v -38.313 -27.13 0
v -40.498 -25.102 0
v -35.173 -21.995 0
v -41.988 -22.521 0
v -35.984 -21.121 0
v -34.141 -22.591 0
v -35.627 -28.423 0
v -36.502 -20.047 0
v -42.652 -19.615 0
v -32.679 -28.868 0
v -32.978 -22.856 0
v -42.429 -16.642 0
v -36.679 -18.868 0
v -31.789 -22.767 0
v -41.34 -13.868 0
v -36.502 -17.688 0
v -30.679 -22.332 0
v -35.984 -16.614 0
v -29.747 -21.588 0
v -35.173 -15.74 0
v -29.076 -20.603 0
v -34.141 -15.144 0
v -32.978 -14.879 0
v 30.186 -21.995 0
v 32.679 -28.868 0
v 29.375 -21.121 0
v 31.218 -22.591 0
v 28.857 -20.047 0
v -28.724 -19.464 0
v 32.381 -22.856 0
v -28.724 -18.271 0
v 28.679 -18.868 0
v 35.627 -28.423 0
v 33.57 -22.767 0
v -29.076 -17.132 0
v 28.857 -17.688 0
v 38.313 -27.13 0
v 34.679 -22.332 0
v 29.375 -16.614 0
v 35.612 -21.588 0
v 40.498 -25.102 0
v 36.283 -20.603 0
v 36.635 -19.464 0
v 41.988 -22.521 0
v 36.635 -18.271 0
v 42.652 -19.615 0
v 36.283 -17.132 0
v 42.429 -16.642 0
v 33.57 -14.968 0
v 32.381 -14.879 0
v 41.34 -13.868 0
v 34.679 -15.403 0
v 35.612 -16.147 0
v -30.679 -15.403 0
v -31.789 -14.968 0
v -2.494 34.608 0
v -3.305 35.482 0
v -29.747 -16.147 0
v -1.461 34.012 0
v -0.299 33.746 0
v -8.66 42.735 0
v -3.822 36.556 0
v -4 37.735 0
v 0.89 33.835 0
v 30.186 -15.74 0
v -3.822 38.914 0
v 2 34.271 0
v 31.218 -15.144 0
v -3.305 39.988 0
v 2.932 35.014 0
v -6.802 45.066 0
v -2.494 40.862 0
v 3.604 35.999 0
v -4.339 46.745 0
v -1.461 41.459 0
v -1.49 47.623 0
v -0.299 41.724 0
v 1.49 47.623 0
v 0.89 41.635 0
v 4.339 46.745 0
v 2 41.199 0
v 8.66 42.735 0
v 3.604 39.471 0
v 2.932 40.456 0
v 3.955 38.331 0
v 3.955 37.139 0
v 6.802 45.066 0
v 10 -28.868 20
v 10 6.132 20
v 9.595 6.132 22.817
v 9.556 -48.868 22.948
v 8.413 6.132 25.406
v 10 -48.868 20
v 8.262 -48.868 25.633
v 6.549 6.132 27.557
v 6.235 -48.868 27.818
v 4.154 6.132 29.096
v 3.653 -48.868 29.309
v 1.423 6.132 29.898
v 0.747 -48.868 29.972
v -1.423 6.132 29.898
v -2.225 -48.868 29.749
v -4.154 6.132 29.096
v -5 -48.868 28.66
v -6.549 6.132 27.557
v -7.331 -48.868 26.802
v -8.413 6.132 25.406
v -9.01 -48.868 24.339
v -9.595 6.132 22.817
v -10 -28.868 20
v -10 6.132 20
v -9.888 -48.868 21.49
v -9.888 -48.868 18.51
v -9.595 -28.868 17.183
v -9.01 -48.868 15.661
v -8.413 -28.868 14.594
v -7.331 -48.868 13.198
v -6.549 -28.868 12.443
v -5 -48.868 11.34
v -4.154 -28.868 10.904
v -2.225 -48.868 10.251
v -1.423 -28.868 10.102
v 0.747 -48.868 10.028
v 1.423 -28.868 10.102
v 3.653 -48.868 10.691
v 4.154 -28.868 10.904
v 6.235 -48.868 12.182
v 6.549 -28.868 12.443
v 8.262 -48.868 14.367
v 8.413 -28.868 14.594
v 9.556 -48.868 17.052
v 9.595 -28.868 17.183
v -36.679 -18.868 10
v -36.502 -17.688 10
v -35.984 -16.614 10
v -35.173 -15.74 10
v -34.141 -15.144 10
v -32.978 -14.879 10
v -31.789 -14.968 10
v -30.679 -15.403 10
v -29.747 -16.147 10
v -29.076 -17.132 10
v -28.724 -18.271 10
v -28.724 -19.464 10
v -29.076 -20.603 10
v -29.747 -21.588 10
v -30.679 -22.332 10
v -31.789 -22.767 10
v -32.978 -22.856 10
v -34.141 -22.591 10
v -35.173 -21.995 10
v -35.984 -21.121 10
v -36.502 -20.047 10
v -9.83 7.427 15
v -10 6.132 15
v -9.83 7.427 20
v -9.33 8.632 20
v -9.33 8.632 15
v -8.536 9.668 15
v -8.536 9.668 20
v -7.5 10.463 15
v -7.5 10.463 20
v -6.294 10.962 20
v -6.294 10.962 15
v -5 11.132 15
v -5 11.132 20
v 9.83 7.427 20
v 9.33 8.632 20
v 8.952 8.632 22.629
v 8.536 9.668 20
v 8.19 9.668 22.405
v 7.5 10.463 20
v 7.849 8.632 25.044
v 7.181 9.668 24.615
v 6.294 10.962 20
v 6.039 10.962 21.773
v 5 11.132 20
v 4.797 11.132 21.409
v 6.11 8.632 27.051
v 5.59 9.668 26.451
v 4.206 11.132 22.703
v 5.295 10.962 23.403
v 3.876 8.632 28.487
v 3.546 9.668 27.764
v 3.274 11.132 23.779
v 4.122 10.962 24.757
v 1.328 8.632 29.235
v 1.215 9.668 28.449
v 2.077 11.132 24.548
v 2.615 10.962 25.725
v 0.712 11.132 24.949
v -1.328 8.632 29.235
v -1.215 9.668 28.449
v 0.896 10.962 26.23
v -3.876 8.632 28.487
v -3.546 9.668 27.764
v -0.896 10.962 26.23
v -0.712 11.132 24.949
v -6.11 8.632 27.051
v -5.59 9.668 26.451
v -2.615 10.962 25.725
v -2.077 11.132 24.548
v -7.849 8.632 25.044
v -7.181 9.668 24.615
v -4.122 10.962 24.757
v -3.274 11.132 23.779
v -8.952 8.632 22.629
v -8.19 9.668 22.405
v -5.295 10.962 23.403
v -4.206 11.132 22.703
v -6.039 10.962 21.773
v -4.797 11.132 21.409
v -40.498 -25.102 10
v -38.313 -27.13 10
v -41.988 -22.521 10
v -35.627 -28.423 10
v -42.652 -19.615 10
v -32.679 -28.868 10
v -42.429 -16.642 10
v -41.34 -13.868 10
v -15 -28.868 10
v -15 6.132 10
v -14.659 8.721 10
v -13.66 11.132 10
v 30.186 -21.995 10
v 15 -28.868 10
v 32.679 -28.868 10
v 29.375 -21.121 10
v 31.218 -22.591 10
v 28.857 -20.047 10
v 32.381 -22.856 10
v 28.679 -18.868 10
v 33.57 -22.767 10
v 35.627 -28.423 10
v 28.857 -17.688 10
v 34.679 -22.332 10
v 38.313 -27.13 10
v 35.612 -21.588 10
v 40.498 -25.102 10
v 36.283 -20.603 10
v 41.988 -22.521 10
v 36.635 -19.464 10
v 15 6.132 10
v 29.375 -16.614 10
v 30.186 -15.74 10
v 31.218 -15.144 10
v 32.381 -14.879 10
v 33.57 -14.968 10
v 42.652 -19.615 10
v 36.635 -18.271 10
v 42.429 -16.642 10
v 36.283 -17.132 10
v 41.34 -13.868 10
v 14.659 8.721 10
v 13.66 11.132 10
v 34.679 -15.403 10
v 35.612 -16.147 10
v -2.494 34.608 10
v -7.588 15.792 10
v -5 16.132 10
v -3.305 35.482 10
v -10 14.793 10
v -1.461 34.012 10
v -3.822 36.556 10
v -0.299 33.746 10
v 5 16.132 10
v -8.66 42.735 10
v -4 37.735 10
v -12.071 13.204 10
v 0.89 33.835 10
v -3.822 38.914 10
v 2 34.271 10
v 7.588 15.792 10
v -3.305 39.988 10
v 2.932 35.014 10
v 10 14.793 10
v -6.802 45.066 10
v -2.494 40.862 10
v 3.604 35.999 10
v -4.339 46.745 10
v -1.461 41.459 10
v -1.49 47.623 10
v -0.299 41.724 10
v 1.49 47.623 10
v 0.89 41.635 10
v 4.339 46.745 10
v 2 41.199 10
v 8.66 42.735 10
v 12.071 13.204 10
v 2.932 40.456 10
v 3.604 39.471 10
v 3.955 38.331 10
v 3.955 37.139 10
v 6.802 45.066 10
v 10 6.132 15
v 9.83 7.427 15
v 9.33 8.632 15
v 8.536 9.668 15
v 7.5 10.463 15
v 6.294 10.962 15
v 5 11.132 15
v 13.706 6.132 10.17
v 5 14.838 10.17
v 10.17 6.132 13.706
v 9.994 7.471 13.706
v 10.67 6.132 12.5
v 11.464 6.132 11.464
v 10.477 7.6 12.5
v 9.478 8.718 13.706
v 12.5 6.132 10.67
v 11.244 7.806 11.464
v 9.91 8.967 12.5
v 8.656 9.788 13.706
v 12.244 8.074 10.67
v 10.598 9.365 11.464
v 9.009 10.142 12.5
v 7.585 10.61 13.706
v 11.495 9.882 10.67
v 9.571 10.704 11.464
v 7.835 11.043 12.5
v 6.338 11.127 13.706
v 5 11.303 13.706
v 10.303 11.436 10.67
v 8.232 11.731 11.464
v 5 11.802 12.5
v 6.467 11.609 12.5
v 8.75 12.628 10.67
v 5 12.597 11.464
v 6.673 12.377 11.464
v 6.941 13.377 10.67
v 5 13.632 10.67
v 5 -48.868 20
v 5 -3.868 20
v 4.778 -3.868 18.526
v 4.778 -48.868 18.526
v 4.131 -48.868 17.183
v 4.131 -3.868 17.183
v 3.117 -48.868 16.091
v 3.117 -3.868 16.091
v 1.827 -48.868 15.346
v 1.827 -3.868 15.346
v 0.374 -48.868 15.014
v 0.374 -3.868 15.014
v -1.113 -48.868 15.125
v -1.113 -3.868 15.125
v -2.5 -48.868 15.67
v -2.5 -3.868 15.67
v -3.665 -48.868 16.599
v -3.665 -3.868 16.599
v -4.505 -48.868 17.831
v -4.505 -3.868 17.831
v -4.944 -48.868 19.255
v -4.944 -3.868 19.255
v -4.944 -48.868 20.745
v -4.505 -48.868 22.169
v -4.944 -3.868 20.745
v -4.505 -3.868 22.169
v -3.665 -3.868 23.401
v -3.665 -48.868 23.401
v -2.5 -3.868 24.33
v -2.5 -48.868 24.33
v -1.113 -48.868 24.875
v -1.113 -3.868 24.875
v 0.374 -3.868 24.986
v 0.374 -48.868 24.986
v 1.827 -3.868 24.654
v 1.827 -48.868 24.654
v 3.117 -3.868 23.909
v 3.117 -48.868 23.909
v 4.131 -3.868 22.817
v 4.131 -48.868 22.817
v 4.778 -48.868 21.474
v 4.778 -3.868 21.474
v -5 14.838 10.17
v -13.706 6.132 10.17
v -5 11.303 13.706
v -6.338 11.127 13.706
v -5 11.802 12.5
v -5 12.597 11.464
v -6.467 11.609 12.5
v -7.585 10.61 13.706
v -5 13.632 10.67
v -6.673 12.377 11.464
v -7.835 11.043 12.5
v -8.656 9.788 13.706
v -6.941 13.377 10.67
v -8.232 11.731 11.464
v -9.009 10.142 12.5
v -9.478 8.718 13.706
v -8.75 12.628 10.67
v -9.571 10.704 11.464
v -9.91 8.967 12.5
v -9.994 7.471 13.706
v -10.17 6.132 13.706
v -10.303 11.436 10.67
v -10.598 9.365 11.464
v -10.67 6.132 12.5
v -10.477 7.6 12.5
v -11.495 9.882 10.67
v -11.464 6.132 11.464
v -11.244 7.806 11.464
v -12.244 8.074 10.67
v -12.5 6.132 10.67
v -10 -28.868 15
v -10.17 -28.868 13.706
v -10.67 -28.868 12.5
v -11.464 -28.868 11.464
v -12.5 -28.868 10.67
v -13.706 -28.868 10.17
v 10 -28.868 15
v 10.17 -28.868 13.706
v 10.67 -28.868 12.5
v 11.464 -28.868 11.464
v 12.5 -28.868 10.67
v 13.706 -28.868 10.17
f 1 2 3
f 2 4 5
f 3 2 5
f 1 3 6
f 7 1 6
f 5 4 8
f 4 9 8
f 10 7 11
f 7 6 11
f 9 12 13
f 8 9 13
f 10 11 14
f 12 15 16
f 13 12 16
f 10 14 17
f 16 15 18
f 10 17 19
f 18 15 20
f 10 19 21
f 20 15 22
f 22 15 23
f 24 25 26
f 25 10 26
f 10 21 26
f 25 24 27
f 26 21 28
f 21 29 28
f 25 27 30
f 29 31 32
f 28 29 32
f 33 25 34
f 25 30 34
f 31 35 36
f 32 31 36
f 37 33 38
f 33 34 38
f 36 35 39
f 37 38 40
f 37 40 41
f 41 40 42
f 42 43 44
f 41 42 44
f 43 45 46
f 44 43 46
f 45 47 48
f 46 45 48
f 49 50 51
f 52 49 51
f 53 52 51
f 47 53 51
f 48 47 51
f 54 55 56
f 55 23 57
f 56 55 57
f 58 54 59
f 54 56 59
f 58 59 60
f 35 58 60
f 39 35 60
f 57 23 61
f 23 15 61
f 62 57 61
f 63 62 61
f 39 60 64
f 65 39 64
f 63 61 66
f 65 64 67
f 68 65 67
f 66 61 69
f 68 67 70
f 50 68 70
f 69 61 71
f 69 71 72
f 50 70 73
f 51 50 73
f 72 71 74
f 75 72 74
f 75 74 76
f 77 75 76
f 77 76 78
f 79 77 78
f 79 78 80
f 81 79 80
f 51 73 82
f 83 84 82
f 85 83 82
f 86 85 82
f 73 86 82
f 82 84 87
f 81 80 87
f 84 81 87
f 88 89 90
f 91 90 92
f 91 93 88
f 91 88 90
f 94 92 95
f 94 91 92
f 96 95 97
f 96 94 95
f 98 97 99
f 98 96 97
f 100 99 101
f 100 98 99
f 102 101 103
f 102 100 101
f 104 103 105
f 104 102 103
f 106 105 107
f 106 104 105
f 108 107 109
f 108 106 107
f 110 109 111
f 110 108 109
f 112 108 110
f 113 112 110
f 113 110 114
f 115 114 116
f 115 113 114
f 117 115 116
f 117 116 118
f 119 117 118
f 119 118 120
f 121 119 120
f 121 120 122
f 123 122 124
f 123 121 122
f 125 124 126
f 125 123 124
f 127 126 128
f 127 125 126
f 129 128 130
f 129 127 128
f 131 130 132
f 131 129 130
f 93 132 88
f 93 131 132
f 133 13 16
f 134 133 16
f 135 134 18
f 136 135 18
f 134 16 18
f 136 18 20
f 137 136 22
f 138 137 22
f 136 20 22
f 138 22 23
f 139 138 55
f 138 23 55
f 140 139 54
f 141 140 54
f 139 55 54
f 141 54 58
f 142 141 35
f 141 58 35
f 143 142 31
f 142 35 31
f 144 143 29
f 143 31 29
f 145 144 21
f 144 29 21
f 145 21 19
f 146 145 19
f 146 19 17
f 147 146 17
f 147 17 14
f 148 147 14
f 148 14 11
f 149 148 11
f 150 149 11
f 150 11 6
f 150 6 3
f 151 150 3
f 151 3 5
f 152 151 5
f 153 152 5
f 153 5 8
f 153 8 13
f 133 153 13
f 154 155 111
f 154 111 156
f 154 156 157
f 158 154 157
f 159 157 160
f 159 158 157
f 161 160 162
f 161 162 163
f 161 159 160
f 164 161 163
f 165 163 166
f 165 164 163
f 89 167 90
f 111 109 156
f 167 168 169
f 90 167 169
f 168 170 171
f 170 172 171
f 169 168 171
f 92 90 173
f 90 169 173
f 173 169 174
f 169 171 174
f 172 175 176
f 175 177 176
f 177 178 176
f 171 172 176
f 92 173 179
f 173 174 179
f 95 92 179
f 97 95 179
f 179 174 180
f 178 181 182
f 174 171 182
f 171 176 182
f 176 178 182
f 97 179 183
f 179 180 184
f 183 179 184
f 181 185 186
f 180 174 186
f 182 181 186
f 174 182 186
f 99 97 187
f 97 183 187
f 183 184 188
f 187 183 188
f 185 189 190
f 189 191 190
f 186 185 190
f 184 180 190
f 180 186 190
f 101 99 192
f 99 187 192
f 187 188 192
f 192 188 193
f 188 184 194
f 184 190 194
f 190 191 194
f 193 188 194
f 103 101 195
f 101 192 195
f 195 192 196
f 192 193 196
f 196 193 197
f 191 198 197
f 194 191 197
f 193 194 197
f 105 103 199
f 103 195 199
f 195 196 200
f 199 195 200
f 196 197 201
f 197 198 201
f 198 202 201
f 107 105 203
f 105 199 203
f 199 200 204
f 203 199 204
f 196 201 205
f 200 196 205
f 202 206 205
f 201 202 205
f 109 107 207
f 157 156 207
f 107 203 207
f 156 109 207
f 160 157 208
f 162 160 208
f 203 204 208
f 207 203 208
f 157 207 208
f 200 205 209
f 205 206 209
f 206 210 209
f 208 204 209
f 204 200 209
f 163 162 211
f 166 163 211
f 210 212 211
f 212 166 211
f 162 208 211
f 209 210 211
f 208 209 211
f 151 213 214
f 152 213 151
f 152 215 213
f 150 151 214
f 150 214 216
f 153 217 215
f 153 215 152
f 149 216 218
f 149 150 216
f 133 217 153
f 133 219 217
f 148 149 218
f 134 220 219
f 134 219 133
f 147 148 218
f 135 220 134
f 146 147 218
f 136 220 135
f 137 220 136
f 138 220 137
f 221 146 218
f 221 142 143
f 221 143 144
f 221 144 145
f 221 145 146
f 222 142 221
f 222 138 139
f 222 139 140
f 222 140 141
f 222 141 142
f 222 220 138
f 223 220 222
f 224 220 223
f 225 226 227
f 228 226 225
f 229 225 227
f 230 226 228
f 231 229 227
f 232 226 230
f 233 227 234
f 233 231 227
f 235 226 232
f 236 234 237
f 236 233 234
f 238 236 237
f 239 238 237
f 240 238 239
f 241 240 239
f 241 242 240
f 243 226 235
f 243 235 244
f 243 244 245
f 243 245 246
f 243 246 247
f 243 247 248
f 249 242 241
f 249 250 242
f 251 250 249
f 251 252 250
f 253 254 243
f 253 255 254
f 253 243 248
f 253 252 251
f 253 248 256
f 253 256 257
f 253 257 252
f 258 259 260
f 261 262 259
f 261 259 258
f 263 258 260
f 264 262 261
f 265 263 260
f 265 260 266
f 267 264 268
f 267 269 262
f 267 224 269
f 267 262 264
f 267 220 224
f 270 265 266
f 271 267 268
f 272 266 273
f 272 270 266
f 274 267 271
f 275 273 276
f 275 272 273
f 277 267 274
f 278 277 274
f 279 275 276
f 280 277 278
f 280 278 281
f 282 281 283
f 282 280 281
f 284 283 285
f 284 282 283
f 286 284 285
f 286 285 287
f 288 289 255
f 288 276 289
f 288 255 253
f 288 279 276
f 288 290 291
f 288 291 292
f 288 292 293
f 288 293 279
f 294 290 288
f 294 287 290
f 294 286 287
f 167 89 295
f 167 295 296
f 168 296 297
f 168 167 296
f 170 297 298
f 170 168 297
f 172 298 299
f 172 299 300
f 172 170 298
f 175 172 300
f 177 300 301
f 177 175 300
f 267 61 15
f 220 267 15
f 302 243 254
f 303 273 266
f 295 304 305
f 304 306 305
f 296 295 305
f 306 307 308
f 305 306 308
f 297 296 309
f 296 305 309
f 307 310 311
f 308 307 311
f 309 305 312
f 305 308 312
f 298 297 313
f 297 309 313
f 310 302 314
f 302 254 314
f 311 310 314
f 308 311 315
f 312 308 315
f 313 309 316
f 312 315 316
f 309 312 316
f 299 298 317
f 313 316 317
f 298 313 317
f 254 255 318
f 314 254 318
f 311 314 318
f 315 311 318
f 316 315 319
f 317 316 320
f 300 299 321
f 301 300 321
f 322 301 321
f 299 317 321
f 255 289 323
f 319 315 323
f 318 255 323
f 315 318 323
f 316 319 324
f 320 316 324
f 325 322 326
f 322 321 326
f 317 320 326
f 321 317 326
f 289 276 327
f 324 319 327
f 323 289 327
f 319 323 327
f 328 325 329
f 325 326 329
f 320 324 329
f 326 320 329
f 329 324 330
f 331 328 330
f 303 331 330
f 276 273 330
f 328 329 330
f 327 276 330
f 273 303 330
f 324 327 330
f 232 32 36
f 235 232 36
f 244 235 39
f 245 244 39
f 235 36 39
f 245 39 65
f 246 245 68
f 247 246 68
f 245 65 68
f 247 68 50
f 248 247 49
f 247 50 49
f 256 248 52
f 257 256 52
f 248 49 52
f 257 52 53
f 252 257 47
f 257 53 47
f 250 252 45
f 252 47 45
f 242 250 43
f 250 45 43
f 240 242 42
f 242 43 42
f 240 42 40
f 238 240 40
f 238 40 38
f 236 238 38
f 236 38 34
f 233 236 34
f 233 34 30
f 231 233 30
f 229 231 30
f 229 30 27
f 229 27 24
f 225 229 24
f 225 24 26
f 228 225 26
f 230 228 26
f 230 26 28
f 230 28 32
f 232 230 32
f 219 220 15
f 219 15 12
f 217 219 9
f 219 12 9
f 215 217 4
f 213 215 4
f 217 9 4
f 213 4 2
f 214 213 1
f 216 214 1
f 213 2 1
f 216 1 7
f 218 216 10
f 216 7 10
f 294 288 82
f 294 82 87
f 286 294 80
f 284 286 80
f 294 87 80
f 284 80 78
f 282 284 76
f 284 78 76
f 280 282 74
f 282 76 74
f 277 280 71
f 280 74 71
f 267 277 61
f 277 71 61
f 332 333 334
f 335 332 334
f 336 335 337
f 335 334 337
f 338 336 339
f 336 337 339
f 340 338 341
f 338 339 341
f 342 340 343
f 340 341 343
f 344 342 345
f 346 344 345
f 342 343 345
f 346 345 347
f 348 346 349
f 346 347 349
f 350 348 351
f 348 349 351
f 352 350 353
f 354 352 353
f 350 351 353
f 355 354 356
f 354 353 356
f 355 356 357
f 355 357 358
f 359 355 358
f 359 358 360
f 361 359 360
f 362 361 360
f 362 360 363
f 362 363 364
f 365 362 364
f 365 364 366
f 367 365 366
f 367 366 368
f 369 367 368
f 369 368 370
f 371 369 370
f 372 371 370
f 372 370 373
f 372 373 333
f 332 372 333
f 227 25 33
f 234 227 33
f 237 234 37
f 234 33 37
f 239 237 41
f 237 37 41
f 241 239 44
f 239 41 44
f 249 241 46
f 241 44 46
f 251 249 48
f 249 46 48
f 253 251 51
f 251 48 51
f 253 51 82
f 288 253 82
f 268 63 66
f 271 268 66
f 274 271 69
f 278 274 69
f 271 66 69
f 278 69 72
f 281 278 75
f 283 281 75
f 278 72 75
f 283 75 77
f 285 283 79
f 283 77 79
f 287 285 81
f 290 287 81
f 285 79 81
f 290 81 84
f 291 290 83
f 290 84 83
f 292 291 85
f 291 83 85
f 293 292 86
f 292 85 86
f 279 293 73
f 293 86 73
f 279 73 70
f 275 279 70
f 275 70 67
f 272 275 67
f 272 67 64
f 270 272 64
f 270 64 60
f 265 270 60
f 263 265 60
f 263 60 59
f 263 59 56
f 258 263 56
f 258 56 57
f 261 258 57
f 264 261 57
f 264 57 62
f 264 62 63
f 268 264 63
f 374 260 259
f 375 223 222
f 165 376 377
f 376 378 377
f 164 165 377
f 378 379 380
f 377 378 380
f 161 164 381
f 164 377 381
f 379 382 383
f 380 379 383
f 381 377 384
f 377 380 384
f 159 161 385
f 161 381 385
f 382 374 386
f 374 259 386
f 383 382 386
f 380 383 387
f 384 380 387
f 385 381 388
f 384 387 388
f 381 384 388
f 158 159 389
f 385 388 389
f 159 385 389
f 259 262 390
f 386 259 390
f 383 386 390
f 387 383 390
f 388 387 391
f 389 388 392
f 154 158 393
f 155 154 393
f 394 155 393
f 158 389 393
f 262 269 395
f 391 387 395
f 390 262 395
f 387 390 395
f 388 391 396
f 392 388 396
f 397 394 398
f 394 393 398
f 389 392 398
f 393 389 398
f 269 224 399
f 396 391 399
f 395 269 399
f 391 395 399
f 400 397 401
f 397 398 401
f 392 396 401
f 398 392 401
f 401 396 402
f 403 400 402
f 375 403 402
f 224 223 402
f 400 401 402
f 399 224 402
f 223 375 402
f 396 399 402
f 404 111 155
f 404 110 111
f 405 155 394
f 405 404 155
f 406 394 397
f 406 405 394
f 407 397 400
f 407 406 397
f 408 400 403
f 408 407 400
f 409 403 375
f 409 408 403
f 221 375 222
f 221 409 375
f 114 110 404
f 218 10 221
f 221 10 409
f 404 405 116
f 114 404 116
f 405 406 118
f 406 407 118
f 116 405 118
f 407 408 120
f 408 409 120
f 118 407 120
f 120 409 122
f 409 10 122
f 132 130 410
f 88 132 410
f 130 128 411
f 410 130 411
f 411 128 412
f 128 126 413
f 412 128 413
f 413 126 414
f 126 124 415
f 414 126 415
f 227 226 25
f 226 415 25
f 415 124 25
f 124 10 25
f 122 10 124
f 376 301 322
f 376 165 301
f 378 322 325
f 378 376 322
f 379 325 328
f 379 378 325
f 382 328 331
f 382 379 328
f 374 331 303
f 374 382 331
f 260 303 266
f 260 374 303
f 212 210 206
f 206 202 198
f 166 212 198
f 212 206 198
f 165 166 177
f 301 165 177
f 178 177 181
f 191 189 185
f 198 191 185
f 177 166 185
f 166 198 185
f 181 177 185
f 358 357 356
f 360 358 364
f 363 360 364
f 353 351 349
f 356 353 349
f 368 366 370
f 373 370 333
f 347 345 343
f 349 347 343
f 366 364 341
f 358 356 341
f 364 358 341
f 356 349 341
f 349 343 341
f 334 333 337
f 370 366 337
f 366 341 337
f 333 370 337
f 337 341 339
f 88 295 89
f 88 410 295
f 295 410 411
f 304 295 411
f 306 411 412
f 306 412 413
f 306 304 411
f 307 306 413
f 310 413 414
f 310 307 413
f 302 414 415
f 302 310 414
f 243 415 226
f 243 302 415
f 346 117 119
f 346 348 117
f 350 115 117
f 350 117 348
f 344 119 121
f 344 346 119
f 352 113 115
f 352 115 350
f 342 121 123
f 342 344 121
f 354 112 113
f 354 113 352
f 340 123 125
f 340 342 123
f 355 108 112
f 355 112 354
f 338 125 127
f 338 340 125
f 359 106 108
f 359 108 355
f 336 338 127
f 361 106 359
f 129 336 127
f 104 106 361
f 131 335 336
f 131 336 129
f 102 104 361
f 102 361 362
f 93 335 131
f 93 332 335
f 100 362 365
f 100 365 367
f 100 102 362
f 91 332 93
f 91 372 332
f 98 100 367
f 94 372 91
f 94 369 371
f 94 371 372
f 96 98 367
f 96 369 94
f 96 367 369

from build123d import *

# Parameters (mm, degrees)
ESTRUSIONE_ESTRUSIONE1_DEPTH = 10
ESTRUSIONE_ESTRUSIONE2_DEPTH = 40
ESTRUSIONE_ESTRUSIONE3_START = 20
ESTRUSIONE_ESTRUSIONE3_DEPTH = 20
FORO_10_0_10_1_D             = 10
FORO_10_0_10_1_DEPTH         = 45
FORO_8_0_8_1_D               = 8
RACCORDO1_R                  = 5
RACCORDO2_R                  = 5


with BuildPart() as part:
    # Schizzo1 → Estrusione-Estrusione1 (new body)
    with BuildSketch(Plane.XY):
        with BuildLine():
            Line((41.339745962, -13.867513459), (8.660254038, 42.735026919))
            ThreePointArc((8.660254038, 42.735026919), (0, 47.735026919), (-8.660254038, 42.735026919))
            Line((-8.660254038, 42.735026919), (-41.339745962, -13.867513459))
            ThreePointArc((-41.339745962, -13.867513459), (-41.339745962, -23.867513459), (-32.679491924, -28.867513459))
            Line((-32.679491924, -28.867513459), (32.679491924, -28.867513459))
            ThreePointArc((32.679491924, -28.867513459), (41.339745962, -23.867513459), (41.339745962, -13.867513459))
        make_face()
    extrude(amount=ESTRUSIONE_ESTRUSIONE1_DEPTH)

    # Schizzo2 → Estrusione-Estrusione2 (add)
    with BuildSketch(Plane.XZ.offset(28.867513459)):
        with BuildLine():
            Line((-10, 10), (10, 10))
            Line((10, 10), (10, 20))
            ThreePointArc((10, 20), (0, 30), (-10, 20))
            Line((-10, 20), (-10, 10))
        make_face()
    extrude(amount=-ESTRUSIONE_ESTRUSIONE2_DEPTH)

    # Schizzo2<3> → Estrusione-Estrusione3 (add)
    with BuildSketch(Plane.XZ.offset(28.867513459).offset(ESTRUSIONE_ESTRUSIONE3_START)):
        with BuildLine():
            ThreePointArc((10, 20), (0, 30), (-10, 20))
            ThreePointArc((-10, 20), (-7.071067812, 12.928932188), (0, 10))
            ThreePointArc((0, 10), (7.071067812, 12.928932188), (10, 20))
        make_face()
    extrude(amount=-ESTRUSIONE_ESTRUSIONE3_DEPTH)

    # Foro Ø10.0 (10)-1
    with Locations(Plane(origin=(0, -48.867513459, 0), x_dir=(-1, 0, 0), z_dir=(0, -1, 0))):
        with Locations((0, -20)):
            Hole(FORO_10_0_10_1_D / 2, depth=FORO_10_0_10_1_DEPTH)

    # Foro Ø8.0 (8)-1 (through all)
    with Locations(Plane.XY.offset(10)):
        with Locations((0, 37.735026919), (-32.679491924, -18.867513459), (32.679491924, -18.867513459)):
            Hole(FORO_8_0_8_1_D / 2)

    # Raccordo1
    raccordo1_edges = [part.edges().sort_by_distance(p)[0] for p in [
        (10, 11.132486541, 15),
        (-10, 11.132486541, 15),
        (0, 11.132486541, 30),
    ]]
    fillet(raccordo1_edges, radius=RACCORDO1_R)

    # Raccordo2
    raccordo2_edges = [part.edges().sort_by_distance(p)[0] for p in [
        (10, -11.367513459, 10),
        (8.535533906, 9.668020446, 10),
        (0, 11.132486541, 10),
        (-8.535533906, 9.668020446, 10),
        (-10, -11.367513459, 10),
    ]]
    fillet(raccordo2_edges, radius=RACCORDO2_R)


solid = part.part
